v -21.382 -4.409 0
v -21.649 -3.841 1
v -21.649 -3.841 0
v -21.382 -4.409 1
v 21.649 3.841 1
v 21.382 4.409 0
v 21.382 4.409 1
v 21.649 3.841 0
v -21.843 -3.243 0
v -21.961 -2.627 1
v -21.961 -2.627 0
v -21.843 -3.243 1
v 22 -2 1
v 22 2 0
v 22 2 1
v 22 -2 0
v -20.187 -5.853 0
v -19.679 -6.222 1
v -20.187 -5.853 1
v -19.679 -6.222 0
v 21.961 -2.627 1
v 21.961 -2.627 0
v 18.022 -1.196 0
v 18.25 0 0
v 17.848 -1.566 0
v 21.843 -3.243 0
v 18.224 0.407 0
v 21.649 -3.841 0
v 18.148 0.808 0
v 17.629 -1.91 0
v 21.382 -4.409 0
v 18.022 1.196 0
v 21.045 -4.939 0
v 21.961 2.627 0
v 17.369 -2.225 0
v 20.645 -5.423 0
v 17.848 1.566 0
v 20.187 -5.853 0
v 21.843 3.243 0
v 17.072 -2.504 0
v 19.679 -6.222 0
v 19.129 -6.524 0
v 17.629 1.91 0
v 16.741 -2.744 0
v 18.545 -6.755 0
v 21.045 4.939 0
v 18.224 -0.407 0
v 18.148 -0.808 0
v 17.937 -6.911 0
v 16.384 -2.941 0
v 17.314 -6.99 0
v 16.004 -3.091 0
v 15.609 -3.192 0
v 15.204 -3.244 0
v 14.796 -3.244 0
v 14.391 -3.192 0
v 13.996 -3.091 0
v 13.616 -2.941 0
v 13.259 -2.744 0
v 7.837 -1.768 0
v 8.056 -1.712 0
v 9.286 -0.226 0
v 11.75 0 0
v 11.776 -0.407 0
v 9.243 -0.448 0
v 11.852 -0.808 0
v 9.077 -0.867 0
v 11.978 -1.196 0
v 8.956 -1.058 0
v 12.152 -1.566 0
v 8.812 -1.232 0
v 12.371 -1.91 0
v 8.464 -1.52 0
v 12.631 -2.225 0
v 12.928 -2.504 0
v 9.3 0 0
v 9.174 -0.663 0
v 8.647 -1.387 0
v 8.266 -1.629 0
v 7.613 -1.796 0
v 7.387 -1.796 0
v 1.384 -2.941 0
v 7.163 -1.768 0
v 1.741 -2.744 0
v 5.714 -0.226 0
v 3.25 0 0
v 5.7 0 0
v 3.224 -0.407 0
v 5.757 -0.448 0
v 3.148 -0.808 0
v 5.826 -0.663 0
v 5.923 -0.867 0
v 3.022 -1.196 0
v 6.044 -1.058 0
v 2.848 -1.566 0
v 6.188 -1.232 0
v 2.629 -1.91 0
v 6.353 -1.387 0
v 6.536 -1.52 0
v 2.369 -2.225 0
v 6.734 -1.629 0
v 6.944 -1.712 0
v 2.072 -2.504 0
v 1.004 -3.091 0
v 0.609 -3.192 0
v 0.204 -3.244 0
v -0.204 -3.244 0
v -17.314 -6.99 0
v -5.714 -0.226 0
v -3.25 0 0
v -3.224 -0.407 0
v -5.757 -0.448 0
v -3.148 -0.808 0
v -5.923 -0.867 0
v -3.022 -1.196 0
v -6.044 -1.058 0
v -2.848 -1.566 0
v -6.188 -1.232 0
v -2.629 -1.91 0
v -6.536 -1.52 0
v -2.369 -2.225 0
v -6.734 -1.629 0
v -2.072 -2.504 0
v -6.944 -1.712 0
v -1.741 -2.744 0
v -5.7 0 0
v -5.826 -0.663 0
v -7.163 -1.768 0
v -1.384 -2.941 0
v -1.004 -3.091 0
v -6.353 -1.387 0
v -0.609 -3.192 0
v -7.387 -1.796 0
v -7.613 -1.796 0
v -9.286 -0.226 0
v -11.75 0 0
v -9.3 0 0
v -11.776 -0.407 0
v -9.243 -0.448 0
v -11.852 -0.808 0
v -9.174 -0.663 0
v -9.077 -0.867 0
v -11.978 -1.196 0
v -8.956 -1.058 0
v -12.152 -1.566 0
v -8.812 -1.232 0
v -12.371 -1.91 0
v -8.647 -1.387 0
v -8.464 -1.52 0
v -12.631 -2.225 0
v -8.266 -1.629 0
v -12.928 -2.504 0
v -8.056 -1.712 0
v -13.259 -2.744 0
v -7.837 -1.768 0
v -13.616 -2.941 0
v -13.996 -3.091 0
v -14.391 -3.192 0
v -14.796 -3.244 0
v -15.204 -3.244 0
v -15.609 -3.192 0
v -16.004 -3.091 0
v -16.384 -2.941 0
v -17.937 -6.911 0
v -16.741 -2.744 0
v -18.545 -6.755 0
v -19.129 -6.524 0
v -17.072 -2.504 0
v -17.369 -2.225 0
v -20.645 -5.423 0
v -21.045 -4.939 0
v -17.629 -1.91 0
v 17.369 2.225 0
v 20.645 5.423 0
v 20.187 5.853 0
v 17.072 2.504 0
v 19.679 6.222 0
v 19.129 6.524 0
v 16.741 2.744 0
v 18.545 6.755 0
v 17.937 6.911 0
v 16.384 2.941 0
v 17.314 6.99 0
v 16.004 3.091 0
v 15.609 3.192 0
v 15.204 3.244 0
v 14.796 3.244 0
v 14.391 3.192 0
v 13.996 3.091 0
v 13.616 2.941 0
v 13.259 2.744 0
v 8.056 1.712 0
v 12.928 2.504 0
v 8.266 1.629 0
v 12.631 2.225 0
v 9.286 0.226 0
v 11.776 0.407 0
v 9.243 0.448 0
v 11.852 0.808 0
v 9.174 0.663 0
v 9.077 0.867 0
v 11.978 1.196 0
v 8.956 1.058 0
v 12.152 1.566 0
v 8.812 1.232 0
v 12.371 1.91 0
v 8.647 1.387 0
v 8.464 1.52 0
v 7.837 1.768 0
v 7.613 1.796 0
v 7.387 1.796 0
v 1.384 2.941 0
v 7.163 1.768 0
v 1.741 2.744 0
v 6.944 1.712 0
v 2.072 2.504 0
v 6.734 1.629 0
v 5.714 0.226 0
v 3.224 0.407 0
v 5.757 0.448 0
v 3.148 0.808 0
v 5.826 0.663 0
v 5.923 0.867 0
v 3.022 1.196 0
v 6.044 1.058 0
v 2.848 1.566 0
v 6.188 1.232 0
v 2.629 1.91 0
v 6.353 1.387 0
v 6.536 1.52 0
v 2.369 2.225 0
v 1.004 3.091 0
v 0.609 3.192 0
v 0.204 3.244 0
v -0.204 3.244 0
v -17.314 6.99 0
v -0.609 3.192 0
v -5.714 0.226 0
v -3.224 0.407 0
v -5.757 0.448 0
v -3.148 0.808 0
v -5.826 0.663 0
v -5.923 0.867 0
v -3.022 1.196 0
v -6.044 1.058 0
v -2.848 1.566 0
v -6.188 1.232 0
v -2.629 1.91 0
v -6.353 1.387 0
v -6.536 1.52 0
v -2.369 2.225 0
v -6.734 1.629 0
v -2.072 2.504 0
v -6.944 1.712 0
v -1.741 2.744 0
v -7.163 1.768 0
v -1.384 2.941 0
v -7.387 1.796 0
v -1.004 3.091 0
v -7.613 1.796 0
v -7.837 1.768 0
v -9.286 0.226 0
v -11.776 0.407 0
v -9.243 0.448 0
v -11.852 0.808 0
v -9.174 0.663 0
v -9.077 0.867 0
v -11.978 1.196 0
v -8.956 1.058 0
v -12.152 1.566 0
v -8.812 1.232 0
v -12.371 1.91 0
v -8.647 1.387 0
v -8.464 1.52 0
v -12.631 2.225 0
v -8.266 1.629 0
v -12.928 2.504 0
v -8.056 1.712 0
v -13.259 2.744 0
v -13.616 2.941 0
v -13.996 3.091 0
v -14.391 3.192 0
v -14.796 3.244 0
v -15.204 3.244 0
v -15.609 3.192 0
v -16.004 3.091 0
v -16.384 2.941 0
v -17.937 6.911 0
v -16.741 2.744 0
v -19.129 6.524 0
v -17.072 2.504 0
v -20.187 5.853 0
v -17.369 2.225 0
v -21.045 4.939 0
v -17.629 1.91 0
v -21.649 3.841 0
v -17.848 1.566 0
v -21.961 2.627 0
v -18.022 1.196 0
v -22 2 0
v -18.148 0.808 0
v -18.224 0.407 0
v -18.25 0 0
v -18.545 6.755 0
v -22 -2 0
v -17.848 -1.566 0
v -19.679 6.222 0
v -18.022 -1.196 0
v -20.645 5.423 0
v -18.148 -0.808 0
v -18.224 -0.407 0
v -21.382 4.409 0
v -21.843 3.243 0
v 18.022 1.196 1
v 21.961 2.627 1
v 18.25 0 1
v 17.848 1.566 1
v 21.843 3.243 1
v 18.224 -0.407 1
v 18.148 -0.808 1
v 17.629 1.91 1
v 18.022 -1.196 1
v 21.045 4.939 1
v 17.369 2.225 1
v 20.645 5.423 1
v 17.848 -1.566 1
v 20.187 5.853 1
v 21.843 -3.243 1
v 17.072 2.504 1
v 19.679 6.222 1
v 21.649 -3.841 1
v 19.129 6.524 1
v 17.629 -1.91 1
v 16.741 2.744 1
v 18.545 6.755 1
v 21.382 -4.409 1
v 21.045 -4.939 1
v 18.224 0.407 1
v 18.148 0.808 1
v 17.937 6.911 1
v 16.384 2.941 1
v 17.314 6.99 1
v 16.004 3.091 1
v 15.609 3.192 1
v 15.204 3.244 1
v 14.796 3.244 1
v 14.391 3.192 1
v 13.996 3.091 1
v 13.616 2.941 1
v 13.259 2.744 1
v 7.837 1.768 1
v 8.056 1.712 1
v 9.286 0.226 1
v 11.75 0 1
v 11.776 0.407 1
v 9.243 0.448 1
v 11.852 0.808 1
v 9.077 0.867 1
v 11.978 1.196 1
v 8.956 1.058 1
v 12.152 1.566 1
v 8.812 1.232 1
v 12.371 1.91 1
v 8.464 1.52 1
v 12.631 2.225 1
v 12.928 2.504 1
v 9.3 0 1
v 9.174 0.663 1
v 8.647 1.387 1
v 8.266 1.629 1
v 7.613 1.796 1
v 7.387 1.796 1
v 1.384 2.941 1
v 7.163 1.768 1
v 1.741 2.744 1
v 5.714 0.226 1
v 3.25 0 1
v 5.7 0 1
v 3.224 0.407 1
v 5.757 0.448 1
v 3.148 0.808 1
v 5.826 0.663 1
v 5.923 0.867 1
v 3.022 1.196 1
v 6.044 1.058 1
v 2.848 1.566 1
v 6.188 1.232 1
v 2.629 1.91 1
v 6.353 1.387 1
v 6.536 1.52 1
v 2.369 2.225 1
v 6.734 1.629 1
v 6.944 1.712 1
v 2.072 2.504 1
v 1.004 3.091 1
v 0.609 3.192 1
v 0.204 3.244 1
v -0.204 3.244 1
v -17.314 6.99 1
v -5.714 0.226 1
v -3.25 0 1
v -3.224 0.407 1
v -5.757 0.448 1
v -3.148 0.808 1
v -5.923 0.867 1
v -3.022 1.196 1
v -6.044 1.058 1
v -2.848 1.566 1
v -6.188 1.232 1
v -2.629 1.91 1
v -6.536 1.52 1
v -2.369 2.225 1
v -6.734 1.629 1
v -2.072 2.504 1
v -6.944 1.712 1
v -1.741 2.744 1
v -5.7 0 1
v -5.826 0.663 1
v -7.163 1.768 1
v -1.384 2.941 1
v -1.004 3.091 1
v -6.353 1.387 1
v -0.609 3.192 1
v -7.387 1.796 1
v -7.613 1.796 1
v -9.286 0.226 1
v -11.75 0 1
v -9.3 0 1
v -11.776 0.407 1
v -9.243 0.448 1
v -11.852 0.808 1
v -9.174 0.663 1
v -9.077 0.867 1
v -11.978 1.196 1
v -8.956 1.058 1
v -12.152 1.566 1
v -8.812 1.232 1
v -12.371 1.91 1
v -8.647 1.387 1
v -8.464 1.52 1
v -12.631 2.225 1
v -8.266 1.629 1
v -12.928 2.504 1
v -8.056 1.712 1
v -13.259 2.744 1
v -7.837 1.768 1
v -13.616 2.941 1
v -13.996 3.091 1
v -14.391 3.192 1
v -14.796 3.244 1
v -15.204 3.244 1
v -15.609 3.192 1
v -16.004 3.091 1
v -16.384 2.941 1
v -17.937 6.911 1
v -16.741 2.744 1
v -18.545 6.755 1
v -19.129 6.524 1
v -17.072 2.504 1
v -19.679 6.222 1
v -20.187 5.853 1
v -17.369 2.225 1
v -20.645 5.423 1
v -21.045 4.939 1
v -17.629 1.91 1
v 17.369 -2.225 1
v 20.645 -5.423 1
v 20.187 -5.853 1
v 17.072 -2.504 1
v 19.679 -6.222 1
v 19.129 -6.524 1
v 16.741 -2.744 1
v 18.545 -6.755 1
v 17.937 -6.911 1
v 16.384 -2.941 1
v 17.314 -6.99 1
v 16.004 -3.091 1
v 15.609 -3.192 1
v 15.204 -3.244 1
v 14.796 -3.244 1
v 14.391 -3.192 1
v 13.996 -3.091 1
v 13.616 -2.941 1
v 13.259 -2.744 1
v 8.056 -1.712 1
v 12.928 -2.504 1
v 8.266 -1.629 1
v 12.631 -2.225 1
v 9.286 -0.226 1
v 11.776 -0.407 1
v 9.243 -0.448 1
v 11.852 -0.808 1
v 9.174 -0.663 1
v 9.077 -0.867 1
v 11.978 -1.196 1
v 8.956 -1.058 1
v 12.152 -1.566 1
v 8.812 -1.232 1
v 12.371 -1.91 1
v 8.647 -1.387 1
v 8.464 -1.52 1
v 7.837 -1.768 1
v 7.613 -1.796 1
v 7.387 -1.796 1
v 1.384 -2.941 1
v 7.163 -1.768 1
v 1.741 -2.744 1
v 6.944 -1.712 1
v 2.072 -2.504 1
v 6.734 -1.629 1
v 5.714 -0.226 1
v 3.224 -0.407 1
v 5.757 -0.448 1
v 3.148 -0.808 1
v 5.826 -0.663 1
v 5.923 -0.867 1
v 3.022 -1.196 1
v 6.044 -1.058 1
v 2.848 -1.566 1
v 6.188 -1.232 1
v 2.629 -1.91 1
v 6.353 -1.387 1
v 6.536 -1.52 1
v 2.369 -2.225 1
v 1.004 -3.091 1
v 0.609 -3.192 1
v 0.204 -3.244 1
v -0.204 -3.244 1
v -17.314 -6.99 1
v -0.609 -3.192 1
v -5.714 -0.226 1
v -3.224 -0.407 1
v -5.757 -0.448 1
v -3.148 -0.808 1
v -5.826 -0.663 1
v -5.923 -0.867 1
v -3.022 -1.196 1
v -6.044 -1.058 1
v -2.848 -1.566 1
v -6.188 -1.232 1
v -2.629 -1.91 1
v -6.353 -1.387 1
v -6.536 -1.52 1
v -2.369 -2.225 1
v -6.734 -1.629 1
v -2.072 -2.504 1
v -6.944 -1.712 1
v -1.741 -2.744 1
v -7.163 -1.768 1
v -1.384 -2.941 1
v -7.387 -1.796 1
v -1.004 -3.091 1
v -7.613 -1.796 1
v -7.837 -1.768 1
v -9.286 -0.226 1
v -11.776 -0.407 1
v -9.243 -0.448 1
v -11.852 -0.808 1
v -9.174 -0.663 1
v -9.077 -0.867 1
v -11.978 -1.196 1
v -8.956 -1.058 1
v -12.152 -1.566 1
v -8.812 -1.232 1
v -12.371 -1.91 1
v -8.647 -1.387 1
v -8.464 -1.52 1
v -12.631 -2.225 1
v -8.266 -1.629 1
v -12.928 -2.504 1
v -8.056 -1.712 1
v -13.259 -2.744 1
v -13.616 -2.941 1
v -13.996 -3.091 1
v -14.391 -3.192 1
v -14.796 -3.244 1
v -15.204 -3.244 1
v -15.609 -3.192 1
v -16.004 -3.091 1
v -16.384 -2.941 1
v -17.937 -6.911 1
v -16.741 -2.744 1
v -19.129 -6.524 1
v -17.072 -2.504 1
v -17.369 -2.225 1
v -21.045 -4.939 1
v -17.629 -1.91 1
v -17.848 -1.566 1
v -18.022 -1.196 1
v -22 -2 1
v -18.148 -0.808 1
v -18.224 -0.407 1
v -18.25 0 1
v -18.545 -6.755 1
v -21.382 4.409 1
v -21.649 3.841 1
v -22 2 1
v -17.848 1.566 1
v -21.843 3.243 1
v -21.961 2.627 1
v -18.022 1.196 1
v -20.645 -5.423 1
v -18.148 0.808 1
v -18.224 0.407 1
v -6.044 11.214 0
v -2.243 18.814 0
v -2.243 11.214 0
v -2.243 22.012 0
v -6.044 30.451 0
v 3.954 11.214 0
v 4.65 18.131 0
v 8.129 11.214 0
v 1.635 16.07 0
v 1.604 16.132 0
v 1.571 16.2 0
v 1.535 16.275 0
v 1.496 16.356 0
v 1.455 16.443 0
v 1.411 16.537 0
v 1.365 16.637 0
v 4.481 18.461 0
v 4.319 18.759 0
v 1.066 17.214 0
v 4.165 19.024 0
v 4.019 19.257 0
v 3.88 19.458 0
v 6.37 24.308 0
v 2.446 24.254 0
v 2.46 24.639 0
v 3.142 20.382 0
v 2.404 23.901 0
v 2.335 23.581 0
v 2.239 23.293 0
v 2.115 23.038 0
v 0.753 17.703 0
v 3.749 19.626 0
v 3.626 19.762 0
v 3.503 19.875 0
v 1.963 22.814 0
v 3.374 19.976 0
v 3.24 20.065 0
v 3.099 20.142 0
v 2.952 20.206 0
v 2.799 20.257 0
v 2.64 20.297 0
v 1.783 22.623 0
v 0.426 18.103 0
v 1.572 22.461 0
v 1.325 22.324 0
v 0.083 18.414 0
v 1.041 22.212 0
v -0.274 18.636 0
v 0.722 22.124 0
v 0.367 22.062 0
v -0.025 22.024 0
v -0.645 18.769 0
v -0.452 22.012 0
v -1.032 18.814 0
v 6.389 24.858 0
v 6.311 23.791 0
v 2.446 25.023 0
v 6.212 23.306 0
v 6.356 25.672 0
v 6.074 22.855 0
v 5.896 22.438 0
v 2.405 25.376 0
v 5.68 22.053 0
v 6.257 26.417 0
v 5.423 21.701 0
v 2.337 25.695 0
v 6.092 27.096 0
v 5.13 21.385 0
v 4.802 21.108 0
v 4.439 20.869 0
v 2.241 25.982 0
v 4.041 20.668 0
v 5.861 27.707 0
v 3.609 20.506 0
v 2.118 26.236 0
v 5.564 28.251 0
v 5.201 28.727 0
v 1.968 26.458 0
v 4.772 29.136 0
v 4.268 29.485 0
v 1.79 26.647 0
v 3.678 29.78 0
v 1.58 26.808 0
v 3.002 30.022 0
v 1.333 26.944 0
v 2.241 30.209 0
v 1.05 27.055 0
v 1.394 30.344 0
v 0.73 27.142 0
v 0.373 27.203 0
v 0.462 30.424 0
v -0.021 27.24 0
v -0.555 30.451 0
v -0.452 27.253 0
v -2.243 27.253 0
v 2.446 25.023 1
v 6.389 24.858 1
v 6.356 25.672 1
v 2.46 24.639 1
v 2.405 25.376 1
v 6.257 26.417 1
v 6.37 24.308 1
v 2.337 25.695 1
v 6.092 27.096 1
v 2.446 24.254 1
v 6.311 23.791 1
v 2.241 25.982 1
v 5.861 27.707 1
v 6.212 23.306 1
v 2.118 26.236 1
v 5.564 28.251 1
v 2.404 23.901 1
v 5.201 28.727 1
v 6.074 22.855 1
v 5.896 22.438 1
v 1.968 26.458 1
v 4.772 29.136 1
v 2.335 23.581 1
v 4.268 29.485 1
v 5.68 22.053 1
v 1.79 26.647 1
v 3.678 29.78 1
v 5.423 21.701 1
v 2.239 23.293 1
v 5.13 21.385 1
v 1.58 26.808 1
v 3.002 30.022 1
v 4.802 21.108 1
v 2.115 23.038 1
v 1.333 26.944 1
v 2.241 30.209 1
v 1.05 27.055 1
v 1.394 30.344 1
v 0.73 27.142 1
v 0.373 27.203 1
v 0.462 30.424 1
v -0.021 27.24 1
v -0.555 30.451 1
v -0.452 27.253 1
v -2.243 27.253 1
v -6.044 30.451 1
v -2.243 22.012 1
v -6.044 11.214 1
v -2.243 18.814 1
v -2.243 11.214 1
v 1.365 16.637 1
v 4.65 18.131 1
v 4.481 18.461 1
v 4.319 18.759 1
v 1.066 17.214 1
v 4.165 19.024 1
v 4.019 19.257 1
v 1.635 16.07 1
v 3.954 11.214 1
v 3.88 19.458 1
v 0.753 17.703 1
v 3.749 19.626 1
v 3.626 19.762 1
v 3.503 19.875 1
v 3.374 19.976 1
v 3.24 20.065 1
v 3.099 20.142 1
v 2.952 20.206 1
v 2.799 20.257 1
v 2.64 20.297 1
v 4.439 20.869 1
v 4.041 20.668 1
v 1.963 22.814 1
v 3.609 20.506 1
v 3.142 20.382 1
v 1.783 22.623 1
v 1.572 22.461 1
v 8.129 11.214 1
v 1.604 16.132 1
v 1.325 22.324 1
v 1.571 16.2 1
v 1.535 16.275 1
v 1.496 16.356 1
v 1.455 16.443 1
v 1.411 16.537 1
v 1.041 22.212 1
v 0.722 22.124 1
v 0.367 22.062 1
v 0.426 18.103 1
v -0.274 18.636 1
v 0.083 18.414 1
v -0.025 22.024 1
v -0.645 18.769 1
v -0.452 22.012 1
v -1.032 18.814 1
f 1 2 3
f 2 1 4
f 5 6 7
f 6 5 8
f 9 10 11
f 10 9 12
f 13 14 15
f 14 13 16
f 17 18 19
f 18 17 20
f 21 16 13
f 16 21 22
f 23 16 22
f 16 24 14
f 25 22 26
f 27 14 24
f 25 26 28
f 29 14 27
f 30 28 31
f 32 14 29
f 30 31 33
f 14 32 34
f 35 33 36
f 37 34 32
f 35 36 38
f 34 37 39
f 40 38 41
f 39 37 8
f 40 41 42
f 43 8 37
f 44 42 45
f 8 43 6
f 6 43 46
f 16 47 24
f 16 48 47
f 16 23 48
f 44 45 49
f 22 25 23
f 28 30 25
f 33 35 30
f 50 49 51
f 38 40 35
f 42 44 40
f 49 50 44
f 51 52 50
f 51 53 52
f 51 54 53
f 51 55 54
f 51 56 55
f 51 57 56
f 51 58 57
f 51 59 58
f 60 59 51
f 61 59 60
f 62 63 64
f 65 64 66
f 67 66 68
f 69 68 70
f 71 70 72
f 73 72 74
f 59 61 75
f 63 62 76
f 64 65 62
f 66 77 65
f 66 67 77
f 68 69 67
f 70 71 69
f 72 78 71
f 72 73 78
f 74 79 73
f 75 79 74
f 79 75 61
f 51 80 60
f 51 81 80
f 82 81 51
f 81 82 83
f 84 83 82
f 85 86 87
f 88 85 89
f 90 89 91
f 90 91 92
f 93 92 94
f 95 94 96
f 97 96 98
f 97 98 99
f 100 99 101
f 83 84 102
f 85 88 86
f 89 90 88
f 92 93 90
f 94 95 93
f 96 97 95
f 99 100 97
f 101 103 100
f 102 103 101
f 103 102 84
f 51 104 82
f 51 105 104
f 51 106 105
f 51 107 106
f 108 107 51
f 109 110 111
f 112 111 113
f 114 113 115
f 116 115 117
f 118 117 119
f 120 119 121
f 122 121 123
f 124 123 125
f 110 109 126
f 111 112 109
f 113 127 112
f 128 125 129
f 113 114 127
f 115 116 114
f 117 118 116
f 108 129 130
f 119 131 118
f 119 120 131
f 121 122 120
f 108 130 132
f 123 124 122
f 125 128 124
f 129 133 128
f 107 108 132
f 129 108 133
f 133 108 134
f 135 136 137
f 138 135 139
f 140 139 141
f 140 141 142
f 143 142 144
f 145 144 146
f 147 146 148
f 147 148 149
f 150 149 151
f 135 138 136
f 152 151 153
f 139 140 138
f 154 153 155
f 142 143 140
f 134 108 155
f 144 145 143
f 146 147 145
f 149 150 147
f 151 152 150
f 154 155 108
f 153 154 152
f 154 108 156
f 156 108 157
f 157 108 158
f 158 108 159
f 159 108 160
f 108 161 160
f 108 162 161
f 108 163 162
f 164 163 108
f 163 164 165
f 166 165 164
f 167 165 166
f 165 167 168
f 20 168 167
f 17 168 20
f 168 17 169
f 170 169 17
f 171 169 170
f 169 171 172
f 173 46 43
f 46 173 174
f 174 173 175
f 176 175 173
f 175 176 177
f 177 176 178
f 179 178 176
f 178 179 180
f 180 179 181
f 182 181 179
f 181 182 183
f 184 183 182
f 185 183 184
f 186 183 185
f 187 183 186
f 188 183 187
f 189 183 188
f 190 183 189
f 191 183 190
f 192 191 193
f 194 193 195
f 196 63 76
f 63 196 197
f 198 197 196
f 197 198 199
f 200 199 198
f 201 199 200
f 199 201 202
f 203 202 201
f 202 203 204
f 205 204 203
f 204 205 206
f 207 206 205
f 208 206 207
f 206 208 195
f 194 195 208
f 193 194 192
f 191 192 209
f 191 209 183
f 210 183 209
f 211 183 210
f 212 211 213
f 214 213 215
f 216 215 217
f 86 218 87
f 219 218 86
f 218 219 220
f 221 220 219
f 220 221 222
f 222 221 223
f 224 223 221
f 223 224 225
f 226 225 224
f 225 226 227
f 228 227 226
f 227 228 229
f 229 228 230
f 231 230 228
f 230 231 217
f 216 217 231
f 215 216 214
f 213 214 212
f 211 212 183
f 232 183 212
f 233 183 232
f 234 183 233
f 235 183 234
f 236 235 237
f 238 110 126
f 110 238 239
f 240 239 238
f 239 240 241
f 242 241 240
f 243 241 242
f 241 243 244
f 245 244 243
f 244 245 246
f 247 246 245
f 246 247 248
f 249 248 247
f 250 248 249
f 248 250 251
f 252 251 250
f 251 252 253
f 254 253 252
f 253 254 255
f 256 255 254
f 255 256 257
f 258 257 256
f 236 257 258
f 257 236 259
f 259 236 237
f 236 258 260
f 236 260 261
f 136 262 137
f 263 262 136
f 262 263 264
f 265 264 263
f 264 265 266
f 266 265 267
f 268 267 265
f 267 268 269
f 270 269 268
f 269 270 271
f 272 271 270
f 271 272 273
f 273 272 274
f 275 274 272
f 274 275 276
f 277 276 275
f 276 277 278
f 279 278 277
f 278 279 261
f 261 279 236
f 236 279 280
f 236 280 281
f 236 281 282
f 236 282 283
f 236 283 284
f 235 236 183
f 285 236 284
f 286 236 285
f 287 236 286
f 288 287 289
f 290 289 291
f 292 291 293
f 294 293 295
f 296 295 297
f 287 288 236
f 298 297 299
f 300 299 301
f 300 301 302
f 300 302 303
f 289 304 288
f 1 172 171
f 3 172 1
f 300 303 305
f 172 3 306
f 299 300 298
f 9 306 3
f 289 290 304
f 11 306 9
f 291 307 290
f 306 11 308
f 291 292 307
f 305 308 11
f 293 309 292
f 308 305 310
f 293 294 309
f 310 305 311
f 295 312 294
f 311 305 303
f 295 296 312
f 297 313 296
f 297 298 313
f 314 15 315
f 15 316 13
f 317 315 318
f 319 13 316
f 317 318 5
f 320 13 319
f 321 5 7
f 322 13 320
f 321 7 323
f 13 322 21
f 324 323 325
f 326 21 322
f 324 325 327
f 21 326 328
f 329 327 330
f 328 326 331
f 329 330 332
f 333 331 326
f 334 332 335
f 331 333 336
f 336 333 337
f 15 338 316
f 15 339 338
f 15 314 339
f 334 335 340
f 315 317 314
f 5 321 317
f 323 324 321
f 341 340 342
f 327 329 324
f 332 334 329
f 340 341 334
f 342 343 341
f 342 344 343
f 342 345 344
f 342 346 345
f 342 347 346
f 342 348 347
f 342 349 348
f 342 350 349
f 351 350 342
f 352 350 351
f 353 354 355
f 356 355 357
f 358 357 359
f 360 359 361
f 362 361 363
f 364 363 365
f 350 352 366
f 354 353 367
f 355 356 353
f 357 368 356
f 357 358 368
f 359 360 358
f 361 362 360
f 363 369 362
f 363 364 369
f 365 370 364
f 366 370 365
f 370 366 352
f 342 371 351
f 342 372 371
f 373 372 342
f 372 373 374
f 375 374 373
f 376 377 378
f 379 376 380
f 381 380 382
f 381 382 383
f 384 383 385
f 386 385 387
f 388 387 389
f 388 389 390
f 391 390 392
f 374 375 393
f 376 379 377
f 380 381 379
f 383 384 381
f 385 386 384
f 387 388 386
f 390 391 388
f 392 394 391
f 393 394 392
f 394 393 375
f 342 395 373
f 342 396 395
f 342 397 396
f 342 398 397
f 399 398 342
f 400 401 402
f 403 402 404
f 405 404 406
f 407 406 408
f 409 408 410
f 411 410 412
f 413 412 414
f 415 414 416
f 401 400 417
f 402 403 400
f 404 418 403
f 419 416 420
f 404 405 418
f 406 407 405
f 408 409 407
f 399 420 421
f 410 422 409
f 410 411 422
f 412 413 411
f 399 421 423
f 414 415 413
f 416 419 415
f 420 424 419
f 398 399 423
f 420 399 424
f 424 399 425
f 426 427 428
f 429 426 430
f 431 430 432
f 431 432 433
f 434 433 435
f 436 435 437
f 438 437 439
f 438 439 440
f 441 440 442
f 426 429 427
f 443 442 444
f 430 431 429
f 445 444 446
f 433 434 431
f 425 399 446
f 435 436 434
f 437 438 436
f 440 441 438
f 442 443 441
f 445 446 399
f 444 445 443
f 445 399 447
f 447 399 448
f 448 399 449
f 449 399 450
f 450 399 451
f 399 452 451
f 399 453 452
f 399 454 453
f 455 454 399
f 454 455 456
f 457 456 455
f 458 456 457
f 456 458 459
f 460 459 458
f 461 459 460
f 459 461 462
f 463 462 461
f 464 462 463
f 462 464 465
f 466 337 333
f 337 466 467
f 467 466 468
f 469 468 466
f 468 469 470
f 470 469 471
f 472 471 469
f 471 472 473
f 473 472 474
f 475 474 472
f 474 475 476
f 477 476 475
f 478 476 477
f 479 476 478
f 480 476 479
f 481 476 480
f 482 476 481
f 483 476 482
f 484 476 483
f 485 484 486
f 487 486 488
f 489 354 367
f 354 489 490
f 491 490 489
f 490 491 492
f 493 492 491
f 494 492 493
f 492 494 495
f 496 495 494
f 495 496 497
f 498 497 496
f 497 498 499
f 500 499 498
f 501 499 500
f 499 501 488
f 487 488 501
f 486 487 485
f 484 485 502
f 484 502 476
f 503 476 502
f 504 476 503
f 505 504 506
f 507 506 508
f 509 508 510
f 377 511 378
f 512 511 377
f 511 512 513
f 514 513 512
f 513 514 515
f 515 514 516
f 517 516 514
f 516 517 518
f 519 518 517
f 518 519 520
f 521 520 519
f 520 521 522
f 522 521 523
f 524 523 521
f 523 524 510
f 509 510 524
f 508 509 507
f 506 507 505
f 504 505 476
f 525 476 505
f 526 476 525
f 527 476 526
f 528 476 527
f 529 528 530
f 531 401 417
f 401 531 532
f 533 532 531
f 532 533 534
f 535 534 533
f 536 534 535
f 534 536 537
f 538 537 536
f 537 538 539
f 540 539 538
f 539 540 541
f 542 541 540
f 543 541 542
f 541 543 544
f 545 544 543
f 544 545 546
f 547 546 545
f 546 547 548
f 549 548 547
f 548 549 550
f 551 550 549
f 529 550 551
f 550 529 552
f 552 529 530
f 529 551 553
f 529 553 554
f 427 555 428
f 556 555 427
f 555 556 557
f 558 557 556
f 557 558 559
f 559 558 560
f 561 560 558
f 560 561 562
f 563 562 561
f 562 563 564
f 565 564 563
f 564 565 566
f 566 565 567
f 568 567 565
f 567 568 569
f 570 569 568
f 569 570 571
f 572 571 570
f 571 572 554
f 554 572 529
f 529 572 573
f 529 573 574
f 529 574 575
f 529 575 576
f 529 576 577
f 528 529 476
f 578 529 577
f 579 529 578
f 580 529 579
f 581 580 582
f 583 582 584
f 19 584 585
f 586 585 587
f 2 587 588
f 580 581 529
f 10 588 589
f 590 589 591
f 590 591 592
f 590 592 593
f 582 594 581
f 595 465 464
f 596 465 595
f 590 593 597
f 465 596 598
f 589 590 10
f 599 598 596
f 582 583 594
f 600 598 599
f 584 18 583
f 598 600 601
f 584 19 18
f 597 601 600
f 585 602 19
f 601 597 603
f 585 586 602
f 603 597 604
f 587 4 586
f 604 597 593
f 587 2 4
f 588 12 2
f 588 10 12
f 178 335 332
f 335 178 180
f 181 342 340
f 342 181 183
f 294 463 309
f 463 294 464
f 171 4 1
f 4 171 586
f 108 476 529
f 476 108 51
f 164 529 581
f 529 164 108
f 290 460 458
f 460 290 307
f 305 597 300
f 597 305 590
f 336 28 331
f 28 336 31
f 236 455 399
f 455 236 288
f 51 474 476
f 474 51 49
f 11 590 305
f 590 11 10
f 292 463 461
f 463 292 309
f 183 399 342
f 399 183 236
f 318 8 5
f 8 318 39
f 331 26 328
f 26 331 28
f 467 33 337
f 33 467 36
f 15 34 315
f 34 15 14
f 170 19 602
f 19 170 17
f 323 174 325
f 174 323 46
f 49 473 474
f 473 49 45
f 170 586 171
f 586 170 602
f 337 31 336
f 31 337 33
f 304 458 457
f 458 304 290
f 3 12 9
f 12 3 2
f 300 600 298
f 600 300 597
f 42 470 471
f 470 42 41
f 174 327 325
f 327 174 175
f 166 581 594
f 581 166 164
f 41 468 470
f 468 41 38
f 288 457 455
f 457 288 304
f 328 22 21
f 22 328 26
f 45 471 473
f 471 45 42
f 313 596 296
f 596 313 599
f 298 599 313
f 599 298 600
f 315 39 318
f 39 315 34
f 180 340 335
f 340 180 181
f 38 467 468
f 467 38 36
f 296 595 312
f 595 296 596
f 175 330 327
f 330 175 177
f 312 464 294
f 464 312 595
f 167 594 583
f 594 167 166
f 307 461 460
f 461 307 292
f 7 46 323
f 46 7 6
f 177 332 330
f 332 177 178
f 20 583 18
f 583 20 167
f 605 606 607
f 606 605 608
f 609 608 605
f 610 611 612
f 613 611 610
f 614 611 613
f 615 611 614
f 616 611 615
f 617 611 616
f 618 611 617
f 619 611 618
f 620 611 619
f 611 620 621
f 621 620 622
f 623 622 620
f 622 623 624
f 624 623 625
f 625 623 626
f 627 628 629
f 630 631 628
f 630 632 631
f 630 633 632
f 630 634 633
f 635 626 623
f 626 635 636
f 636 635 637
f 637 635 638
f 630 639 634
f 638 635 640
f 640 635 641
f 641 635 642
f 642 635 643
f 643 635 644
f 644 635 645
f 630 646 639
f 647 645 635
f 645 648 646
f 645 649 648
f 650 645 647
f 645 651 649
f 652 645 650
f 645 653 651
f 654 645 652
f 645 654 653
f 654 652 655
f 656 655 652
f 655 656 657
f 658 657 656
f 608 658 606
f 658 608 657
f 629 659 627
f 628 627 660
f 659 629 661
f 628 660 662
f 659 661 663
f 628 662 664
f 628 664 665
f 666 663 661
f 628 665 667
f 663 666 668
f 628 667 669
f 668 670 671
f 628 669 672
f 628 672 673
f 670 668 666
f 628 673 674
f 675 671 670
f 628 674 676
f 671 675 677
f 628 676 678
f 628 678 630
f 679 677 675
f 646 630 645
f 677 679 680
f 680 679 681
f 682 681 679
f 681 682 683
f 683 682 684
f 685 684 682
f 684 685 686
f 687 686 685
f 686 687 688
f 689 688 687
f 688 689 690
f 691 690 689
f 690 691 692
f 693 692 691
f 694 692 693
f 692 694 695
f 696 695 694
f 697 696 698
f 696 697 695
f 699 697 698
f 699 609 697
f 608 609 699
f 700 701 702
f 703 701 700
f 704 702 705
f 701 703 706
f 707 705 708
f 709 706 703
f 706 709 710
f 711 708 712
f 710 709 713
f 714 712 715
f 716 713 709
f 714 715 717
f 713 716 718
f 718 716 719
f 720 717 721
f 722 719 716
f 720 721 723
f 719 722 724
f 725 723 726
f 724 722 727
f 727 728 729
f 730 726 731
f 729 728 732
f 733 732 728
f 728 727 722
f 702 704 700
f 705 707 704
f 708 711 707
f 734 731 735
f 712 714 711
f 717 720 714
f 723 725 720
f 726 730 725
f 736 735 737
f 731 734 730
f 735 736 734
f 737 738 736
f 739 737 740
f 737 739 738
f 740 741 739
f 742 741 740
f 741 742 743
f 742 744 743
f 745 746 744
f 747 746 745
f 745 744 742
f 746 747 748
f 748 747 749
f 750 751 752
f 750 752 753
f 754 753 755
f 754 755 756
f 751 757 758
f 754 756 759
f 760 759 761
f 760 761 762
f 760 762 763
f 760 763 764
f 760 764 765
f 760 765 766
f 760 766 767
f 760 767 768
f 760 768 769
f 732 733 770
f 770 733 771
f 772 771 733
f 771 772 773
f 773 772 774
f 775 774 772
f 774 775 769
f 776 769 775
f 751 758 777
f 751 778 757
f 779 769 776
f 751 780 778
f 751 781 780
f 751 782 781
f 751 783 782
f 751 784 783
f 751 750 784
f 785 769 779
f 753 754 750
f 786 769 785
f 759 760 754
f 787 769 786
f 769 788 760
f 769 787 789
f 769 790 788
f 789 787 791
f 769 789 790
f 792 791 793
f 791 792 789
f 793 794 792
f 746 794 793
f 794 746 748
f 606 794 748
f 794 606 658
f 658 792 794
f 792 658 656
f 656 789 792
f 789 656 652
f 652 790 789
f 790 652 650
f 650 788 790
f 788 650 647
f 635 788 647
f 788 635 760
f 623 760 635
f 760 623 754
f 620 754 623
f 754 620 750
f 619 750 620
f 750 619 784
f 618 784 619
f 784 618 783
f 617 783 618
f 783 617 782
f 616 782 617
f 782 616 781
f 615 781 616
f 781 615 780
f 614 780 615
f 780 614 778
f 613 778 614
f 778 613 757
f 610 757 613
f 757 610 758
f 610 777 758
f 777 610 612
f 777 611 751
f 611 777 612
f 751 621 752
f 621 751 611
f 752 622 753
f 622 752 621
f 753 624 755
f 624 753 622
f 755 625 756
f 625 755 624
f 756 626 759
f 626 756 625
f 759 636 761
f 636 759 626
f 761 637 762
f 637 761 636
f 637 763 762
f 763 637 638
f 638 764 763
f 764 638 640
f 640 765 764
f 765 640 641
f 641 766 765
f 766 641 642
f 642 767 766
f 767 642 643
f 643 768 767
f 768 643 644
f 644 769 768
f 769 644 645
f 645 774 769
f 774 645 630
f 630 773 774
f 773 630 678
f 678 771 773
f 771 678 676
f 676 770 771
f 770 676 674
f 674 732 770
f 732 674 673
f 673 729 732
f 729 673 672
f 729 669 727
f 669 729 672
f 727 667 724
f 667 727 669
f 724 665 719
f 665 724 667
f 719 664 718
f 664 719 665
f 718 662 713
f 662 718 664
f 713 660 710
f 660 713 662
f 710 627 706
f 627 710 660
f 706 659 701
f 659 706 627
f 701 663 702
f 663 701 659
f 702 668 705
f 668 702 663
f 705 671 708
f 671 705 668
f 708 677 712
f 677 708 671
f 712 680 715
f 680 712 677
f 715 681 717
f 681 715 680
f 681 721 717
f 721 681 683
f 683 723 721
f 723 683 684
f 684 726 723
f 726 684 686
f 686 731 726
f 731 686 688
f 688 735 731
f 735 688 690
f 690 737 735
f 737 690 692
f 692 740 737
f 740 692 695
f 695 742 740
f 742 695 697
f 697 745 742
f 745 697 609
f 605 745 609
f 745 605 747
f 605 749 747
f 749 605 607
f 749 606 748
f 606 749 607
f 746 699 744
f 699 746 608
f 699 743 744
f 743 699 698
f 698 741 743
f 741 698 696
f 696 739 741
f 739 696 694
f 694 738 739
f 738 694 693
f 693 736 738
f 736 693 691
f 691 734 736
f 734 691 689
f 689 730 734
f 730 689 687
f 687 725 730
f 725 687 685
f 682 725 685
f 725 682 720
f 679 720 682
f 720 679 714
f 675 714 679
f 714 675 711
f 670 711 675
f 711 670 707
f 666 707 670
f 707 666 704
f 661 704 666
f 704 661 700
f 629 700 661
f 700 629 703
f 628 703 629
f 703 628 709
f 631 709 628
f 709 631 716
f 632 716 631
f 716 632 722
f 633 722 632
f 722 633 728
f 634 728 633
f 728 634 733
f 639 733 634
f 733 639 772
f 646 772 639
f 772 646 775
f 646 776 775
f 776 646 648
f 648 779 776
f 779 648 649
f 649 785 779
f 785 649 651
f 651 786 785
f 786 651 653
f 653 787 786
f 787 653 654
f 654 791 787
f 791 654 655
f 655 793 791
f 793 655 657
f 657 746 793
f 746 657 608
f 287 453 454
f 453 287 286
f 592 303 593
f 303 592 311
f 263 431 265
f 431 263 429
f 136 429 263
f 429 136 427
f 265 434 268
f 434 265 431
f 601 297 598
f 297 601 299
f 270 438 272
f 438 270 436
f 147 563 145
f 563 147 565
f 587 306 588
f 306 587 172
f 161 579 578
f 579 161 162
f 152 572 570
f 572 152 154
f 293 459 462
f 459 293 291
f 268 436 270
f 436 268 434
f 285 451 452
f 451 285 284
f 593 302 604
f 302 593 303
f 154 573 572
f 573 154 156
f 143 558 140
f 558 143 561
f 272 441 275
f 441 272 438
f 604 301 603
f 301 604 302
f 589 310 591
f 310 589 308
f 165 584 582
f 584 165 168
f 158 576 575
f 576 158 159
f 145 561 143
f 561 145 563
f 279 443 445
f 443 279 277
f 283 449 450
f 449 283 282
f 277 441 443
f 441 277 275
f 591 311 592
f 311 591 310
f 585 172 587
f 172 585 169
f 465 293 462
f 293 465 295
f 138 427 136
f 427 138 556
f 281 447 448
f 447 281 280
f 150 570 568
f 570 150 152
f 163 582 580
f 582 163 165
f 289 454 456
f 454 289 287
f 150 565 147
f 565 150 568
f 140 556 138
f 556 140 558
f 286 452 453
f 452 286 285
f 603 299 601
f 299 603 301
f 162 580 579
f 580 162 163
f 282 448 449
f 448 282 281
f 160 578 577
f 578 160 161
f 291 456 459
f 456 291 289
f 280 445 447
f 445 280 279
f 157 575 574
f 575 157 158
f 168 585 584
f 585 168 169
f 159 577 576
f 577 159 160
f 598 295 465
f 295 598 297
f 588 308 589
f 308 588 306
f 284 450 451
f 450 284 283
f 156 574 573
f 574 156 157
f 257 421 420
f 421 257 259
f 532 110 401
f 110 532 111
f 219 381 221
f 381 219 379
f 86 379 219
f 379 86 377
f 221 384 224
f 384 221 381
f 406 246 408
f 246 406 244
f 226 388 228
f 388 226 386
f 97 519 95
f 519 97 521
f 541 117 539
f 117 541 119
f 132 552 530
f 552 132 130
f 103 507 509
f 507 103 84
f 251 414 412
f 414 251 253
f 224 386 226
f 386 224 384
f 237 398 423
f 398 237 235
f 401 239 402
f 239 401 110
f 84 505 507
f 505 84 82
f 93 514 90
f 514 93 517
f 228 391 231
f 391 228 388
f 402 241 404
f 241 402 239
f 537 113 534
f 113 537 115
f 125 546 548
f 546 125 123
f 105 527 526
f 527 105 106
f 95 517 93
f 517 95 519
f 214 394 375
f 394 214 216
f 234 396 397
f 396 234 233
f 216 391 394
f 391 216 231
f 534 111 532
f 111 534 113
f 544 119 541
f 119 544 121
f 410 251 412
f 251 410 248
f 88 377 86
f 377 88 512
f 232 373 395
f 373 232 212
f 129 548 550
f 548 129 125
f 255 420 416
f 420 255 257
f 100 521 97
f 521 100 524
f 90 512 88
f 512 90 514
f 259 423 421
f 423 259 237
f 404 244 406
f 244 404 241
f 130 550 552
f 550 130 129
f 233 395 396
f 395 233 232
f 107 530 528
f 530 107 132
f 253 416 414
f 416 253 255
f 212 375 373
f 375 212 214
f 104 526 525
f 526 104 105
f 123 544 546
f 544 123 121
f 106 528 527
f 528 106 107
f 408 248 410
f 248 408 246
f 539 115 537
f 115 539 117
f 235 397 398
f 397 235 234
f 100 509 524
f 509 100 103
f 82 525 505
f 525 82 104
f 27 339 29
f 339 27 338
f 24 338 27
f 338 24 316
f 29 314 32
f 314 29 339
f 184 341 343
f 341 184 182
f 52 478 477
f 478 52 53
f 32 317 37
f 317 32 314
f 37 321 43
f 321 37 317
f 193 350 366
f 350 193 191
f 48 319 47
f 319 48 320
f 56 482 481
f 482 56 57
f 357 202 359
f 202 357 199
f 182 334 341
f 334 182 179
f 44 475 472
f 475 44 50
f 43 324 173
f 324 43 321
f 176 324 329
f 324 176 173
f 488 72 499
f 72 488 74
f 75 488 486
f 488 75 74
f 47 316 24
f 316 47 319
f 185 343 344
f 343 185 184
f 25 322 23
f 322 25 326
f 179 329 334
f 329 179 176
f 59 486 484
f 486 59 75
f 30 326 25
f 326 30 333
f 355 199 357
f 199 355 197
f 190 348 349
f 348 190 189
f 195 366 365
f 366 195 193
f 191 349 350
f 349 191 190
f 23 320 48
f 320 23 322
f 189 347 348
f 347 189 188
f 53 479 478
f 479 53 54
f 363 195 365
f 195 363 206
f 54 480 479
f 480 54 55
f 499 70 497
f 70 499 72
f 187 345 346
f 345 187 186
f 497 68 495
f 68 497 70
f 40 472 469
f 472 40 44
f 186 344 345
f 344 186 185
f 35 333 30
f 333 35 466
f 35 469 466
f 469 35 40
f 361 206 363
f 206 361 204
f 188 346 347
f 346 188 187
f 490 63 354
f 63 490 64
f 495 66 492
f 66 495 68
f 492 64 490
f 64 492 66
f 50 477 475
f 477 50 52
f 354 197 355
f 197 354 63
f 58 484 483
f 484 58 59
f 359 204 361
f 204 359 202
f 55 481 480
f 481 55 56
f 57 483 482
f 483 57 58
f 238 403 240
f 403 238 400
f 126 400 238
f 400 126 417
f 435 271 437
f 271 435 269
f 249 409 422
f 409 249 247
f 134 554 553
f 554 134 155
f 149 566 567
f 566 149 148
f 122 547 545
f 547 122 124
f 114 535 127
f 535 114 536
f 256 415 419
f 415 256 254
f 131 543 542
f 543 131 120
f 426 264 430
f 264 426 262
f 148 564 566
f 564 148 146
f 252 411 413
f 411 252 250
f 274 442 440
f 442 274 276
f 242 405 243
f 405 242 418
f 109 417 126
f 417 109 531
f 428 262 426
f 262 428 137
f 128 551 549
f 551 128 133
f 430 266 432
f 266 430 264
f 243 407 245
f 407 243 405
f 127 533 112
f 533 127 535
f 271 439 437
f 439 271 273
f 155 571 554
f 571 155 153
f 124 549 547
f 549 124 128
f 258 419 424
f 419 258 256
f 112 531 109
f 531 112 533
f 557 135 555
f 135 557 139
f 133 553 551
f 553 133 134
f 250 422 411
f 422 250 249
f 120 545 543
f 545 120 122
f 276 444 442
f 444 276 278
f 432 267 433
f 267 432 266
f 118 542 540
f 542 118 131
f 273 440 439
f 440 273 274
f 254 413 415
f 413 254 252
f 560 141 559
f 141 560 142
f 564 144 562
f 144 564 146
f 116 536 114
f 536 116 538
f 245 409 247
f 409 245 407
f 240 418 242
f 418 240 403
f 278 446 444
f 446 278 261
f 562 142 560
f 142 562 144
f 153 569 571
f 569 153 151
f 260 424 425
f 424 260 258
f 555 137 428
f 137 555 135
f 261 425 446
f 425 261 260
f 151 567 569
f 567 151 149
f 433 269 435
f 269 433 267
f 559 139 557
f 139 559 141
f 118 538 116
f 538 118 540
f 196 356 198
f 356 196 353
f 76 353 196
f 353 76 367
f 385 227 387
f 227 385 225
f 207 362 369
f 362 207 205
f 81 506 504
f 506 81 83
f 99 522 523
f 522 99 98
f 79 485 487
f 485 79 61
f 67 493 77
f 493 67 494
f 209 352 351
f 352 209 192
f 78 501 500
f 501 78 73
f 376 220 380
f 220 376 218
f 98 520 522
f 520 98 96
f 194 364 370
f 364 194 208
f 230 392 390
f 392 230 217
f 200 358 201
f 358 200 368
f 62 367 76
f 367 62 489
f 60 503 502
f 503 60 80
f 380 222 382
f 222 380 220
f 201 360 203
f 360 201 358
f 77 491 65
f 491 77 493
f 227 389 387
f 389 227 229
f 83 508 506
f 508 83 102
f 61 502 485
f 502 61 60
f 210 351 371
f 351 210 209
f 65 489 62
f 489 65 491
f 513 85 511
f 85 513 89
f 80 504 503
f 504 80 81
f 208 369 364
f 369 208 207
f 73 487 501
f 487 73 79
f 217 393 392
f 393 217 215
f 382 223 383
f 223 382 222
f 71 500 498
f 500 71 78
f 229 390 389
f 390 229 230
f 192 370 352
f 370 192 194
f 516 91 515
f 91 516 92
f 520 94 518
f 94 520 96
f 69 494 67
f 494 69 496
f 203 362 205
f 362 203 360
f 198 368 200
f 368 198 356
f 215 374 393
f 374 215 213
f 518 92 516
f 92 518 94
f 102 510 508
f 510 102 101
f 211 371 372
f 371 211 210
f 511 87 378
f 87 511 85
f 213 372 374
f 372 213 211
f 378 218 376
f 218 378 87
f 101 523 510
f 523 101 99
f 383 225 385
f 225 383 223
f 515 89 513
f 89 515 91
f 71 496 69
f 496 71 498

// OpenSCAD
$fn = 50;


difference() {
	union() {
		hull() {
			translate(v = [-17.0000000000, 2.0000000000, 0]) {
				cylinder(h = 1, r = 5);
			}
			translate(v = [17.0000000000, 2.0000000000, 0]) {
				cylinder(h = 1, r = 5);
			}
			translate(v = [-17.0000000000, -2.0000000000, 0]) {
				cylinder(h = 1, r = 5);
			}
			translate(v = [17.0000000000, -2.0000000000, 0]) {
				cylinder(h = 1, r = 5);
			}
		}
		translate(v = [0, 30.0000000000, 0]) {
			linear_extrude(height = 1) {
				text(font = "DejaVu Sans Mono:style=Bold", halign = "center", size = 19.0000000000, text = "R", valign = "top");
			}
		}
	}
	union() {
		translate(v = [-15.0000000000, 0.0000000000, 0]) {
			translate(v = [0, 0, -100]) {
				cylinder(h = 200, r = 3.2500000000);
			}
		}
		translate(v = [0, 0, -100]) {
			cylinder(h = 200, r = 3.2500000000);
		}
		translate(v = [15.0000000000, 0.0000000000, 0]) {
			translate(v = [0, 0, -100]) {
				cylinder(h = 200, r = 3.2500000000);
			}
		}
		translate(v = [-15.0000000000, 0.0000000000, 0]) {
			translate(v = [0, 0, -100]) {
				cylinder(h = 200, r = 1.8000000000);
			}
		}
		translate(v = [-7.5000000000, 0.0000000000, 0]) {
			translate(v = [0, 0, -100]) {
				cylinder(h = 200, r = 1.8000000000);
			}
		}
		translate(v = [0, 0, -100]) {
			cylinder(h = 200, r = 1.8000000000);
		}
		translate(v = [7.5000000000, 0.0000000000, 0]) {
			translate(v = [0, 0, -100]) {
				cylinder(h = 200, r = 1.8000000000);
			}
		}
		translate(v = [15.0000000000, 0.0000000000, 0]) {
			translate(v = [0, 0, -100]) {
				cylinder(h = 200, r = 1.8000000000);
			}
		}
	}
}
